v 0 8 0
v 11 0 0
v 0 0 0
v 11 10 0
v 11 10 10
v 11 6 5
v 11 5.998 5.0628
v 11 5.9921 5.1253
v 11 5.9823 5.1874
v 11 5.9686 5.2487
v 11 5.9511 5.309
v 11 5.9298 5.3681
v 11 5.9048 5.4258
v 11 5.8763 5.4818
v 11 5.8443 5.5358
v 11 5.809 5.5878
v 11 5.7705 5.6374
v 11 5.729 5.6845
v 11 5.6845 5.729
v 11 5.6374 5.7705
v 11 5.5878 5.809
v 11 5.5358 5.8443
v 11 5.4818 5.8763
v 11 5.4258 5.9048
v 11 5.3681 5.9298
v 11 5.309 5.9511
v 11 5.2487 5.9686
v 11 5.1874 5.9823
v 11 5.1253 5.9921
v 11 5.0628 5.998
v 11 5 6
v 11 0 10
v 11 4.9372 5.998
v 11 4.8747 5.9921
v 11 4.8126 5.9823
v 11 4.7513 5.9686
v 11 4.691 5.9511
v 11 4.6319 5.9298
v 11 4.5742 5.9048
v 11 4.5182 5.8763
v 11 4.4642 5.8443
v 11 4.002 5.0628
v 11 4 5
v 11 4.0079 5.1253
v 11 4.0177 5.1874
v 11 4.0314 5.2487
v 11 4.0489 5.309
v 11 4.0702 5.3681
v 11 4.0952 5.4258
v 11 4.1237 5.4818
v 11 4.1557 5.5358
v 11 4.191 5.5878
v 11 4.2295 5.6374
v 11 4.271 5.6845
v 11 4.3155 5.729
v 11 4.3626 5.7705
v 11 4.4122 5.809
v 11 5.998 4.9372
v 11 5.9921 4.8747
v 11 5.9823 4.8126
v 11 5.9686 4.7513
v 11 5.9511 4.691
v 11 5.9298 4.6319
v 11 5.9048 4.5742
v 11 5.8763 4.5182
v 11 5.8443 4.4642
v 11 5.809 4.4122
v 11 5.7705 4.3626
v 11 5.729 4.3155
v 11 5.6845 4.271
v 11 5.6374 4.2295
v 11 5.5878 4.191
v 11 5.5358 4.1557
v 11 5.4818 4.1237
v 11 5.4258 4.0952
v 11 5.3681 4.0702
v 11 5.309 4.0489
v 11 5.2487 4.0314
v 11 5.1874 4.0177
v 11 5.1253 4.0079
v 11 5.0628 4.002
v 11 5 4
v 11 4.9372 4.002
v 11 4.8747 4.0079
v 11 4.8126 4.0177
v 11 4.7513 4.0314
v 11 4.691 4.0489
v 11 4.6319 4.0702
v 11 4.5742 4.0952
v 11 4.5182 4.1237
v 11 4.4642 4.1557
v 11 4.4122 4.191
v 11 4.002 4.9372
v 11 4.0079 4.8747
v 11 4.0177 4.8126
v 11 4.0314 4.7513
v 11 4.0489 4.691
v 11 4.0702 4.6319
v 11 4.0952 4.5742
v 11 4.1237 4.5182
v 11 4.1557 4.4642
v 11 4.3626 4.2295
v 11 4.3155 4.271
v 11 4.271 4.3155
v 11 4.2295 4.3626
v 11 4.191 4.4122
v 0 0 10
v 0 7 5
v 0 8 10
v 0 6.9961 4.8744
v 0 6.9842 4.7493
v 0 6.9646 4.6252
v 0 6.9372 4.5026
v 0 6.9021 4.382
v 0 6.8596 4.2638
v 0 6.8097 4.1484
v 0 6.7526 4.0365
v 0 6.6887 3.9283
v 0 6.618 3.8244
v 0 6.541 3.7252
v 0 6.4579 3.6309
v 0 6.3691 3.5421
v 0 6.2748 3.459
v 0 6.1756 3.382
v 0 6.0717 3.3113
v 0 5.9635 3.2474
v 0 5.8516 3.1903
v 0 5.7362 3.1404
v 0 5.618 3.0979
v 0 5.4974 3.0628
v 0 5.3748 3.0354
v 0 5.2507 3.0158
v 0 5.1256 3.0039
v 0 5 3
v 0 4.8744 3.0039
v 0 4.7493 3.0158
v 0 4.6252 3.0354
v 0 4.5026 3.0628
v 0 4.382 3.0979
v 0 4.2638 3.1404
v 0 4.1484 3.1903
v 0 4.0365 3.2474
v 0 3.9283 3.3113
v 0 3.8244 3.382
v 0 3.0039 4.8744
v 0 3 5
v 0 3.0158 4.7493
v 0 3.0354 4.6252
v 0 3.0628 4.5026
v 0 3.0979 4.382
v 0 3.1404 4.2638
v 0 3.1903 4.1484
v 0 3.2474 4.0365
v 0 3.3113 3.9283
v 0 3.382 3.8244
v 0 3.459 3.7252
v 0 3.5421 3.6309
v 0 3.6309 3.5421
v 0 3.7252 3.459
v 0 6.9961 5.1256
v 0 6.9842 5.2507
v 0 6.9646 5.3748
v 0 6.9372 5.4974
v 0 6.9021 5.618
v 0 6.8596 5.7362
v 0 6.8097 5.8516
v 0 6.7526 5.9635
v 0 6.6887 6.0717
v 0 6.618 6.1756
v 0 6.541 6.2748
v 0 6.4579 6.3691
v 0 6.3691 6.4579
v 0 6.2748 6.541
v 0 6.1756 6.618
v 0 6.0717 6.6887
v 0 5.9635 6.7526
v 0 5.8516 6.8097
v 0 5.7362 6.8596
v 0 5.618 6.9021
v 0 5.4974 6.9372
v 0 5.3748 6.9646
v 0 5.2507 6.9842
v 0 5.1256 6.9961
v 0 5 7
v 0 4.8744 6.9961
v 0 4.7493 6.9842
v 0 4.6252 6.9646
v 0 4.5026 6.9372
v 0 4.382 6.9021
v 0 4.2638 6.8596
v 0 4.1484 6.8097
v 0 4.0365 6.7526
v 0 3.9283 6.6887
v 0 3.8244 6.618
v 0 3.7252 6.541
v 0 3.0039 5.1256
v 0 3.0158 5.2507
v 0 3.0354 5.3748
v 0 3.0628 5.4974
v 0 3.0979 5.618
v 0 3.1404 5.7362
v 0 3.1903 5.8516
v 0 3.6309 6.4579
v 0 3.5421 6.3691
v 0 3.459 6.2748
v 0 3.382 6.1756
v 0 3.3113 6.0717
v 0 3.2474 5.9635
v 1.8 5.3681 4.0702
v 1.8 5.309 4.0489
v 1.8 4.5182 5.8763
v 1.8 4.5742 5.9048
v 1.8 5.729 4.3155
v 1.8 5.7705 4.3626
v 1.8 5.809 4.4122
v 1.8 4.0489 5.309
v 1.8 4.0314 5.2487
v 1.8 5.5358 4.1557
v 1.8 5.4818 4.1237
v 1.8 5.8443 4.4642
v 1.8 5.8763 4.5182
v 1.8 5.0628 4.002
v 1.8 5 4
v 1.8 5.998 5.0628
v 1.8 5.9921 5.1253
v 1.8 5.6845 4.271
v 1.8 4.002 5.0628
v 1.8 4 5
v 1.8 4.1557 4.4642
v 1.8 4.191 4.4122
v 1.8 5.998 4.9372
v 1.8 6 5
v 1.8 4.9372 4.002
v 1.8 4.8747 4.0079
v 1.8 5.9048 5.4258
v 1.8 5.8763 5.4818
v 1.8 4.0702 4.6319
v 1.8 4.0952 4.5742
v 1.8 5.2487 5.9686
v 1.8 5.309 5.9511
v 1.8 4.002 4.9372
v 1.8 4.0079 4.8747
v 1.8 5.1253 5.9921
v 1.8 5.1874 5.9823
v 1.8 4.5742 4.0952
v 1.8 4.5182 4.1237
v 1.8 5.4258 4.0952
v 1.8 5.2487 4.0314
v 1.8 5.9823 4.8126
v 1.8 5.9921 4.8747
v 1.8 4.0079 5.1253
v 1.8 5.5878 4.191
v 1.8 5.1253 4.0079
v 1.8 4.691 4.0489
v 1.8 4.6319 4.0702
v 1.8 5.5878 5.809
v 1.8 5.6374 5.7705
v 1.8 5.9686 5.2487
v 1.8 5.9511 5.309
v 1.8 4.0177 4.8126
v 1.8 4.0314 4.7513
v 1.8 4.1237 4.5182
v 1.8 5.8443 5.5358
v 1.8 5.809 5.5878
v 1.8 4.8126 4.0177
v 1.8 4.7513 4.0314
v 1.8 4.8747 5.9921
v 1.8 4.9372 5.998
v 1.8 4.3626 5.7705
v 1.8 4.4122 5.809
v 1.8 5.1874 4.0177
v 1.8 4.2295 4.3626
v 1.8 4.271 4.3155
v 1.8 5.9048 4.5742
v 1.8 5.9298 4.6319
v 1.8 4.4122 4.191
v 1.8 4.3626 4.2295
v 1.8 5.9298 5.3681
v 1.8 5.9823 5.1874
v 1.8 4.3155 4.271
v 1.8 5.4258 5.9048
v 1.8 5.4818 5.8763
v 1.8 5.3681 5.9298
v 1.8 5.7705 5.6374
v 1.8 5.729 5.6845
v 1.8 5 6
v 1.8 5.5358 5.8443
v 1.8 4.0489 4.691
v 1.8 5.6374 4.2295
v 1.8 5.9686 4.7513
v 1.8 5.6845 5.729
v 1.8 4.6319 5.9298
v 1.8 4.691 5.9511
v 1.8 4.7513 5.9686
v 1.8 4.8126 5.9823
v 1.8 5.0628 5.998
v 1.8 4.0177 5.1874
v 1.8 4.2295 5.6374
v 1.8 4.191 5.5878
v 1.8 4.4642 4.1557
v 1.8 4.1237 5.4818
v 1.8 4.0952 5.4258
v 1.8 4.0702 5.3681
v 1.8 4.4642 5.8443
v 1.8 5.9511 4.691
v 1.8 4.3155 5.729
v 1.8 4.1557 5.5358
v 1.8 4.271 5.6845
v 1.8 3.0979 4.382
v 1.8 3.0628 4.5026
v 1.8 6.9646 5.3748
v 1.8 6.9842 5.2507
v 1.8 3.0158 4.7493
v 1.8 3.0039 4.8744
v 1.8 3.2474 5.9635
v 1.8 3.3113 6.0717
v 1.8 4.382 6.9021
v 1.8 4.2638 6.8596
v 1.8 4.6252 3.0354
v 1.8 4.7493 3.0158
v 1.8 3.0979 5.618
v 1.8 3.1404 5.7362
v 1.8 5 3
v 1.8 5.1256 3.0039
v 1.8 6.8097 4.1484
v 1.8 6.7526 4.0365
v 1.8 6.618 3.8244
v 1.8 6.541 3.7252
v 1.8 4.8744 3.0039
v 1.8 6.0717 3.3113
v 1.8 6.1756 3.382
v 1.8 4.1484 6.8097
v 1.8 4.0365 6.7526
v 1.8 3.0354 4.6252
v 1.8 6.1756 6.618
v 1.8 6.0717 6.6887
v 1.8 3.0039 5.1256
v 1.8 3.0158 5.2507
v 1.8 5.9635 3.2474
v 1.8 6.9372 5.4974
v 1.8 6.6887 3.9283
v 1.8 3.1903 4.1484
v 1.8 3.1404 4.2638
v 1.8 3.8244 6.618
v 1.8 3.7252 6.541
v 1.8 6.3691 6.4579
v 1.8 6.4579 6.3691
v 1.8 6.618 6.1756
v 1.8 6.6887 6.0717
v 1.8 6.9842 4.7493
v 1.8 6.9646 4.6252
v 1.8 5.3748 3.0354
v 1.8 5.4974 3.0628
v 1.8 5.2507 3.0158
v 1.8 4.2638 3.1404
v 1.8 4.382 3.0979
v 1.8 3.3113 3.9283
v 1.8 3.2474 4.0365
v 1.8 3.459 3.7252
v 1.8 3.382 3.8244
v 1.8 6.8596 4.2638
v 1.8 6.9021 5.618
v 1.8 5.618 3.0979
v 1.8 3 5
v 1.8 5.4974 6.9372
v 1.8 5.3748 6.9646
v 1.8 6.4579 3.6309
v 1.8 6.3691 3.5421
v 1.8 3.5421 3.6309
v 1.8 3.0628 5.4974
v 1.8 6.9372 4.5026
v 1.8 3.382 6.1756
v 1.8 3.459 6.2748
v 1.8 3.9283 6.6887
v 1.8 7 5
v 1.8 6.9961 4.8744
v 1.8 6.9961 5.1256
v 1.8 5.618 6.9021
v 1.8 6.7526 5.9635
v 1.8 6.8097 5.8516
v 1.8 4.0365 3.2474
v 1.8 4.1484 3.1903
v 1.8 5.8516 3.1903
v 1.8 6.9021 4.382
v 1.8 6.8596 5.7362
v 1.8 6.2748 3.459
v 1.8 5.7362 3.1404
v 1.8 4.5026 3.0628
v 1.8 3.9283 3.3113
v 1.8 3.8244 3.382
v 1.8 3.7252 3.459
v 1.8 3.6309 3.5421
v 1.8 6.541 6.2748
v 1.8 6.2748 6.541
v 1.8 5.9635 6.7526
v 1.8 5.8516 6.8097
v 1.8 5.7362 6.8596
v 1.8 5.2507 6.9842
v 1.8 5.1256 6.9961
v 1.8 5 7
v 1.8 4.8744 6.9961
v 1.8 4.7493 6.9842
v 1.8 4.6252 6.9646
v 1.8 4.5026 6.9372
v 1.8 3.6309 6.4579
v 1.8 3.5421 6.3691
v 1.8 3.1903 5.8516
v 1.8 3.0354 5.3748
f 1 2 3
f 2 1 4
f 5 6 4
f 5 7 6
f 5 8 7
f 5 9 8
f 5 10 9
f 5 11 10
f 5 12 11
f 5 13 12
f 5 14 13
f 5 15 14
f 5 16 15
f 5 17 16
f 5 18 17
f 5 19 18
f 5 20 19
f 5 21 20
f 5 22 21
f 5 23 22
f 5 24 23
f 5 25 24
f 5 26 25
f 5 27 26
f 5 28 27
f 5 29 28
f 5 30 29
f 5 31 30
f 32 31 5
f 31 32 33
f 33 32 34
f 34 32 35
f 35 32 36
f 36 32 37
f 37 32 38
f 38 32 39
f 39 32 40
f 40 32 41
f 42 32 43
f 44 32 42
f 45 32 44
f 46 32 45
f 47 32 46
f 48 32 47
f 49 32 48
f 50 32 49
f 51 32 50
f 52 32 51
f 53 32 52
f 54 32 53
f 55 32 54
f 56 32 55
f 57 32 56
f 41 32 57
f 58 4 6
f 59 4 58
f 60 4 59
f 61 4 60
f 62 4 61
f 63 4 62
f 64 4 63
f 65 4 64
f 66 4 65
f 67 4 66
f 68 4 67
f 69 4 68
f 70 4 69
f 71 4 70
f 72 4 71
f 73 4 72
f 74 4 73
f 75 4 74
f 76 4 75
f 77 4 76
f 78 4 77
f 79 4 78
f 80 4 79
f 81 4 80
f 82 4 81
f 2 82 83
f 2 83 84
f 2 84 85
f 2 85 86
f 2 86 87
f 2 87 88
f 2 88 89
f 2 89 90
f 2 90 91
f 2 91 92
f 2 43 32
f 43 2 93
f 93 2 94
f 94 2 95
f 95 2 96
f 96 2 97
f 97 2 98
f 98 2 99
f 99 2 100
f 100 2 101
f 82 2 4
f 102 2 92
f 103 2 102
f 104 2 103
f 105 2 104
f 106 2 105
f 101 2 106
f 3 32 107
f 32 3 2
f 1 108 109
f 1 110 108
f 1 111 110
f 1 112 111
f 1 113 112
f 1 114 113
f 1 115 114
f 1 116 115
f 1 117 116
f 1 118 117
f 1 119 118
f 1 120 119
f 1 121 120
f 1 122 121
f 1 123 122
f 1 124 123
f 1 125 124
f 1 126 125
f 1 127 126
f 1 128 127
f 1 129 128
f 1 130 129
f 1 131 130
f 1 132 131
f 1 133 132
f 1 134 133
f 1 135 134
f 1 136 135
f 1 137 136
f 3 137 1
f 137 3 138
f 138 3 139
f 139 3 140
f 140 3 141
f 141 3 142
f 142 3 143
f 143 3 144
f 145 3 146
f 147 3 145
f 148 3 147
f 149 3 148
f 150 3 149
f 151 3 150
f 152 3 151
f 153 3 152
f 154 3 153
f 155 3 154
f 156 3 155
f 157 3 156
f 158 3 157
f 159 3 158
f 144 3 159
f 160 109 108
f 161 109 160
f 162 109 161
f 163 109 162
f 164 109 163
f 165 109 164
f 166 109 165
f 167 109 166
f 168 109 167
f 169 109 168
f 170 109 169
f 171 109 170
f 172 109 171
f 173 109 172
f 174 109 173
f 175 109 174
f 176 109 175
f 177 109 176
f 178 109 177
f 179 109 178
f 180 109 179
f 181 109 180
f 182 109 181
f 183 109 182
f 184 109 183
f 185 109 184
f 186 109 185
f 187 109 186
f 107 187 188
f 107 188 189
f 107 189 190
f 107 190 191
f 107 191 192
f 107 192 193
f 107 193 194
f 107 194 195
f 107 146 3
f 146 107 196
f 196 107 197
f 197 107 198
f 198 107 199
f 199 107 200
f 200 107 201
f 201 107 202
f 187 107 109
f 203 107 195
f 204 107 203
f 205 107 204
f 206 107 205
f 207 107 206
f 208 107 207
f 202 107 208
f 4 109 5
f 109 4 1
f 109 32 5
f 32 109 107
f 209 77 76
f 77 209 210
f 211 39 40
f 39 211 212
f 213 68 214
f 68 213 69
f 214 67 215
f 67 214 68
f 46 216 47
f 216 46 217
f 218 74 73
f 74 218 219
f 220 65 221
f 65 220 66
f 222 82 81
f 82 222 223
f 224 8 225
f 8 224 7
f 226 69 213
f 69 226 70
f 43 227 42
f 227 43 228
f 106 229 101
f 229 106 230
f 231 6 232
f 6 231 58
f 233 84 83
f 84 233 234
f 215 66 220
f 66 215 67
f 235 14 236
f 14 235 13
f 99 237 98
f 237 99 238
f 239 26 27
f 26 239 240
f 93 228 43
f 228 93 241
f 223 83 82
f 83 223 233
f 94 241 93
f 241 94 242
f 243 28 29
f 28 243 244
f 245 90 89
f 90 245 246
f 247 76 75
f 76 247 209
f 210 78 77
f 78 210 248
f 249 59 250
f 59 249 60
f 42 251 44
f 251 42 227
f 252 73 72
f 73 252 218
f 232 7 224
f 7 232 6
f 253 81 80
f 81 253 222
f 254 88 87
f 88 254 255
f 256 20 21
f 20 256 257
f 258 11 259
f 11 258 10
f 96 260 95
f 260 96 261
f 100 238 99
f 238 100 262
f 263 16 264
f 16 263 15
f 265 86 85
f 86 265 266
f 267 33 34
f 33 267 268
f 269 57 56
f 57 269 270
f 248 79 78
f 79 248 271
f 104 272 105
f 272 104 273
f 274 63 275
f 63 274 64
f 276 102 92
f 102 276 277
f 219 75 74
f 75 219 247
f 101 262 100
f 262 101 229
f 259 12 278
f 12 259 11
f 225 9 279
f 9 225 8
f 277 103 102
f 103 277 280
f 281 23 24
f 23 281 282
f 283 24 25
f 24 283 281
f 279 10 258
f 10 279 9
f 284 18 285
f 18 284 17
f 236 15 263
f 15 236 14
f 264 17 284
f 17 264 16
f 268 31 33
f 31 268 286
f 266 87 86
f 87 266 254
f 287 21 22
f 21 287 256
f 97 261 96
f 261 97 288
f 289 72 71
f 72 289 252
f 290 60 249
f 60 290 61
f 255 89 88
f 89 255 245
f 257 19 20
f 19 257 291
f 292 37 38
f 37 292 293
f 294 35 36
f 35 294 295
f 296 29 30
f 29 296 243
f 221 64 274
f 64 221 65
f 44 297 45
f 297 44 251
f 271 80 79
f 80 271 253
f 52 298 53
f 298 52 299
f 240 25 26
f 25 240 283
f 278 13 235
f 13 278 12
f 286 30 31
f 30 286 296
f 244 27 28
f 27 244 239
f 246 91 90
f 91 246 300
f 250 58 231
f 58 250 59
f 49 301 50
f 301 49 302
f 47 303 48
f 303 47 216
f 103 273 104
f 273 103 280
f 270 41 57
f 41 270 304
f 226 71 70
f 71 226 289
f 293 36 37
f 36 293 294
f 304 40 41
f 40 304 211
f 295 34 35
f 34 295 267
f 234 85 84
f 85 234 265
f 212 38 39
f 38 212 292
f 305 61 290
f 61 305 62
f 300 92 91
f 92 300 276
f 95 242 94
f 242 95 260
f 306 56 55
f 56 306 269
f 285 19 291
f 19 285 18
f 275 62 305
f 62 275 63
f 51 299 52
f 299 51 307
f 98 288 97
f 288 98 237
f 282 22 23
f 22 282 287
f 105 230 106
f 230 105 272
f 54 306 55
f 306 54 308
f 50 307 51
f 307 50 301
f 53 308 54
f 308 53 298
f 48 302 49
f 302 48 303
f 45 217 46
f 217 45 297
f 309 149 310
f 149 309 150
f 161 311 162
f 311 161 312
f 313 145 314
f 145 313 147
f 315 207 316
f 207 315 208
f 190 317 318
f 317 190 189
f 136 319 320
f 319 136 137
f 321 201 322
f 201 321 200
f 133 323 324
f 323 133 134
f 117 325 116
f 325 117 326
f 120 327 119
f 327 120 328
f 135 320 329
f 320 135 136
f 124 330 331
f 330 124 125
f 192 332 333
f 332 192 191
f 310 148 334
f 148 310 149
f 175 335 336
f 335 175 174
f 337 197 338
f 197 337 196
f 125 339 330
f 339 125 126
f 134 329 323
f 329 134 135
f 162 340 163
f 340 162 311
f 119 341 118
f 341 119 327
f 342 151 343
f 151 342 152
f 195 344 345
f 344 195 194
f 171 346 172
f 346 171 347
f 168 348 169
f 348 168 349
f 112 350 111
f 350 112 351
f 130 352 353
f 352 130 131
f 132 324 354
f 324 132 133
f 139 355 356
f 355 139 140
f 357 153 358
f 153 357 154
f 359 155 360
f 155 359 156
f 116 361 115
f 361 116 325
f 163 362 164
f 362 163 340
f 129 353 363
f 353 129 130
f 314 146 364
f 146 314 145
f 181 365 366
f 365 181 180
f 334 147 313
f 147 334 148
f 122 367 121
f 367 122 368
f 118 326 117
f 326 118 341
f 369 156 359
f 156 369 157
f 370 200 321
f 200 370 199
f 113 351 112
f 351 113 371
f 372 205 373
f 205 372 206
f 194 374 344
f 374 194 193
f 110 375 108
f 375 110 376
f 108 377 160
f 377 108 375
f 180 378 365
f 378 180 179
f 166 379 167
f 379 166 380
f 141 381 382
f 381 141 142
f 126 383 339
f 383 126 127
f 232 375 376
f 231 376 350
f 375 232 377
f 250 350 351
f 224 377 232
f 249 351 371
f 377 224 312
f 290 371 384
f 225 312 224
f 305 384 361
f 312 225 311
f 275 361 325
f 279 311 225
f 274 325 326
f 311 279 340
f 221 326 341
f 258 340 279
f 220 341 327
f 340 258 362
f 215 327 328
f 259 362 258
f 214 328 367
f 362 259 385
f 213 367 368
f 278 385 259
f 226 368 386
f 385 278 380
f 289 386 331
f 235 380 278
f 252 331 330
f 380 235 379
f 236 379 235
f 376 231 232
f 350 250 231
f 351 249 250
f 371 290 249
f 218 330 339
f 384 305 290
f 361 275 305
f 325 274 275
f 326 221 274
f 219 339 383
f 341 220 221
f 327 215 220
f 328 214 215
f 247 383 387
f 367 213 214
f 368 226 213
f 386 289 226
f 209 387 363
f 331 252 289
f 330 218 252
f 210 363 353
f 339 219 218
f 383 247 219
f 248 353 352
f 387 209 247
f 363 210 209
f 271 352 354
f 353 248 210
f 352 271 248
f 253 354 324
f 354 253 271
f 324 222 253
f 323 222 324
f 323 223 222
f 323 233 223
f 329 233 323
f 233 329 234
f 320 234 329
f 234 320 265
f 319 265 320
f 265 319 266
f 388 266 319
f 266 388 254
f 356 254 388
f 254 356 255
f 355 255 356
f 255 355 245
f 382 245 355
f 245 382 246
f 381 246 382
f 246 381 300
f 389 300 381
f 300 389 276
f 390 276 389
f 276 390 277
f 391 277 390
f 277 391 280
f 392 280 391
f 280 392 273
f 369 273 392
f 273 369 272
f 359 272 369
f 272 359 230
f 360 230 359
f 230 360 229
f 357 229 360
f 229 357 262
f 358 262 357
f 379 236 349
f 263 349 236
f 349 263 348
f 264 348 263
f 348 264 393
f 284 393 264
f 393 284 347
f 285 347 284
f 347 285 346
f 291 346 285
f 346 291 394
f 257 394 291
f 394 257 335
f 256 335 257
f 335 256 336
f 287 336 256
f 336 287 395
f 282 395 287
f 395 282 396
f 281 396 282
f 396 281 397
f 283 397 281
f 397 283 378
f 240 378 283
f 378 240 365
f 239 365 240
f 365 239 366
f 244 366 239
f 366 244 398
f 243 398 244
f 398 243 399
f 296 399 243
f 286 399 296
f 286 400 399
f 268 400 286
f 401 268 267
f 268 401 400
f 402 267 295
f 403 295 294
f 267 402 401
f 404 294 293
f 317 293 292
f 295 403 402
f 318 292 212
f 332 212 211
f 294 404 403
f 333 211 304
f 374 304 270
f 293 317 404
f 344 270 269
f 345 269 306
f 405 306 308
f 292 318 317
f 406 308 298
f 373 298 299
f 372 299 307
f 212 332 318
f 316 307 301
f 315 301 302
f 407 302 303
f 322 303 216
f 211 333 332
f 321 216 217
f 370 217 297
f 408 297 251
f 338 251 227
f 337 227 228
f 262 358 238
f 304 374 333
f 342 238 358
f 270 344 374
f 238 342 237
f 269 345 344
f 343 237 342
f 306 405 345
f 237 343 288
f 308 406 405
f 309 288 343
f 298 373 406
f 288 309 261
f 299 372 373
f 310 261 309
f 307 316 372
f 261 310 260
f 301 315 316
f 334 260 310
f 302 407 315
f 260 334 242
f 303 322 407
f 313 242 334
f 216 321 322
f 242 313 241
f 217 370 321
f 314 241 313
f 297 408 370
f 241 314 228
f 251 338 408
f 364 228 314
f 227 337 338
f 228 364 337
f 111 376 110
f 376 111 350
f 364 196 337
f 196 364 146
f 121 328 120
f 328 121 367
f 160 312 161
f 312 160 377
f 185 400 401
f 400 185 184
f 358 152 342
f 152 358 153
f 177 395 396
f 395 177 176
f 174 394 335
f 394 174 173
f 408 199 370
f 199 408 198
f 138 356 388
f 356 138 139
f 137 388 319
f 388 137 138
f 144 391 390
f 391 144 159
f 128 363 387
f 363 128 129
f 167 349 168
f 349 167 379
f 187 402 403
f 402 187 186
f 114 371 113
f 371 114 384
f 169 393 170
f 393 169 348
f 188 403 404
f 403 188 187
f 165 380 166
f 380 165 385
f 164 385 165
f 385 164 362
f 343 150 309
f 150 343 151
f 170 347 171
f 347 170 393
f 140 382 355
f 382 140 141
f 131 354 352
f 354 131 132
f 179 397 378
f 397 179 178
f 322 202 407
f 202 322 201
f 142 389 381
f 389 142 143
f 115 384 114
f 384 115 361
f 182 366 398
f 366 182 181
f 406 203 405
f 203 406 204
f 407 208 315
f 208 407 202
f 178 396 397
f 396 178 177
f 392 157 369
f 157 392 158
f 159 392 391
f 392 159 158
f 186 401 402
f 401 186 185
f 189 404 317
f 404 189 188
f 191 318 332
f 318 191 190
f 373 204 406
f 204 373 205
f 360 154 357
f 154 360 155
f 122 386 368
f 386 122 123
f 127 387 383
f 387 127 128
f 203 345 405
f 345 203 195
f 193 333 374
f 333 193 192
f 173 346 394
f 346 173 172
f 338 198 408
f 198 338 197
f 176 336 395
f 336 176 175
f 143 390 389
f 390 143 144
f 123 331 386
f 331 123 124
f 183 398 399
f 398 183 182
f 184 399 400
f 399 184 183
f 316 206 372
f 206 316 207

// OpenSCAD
//cylinder(15,15,10,$fn=4);
//cube ([10,8,8]);
//cube(30);
//cube (size=10, center=true);
//cube ([5,10,15]);
difference(){
difference(){
linear_extrude(height = 10, convexity = 10, twist = 0)
  polygon ([[0,0],[0,8],[11,10],[11,0]]);
 $fn = 100; 
translate([-2,5,5]) rotate ([0,90,0]) cylinder(r=1, h=14); }
$fn = 100; 
translate([-0.2,5,5]) rotate ([0,90,0]) cylinder(r=2, h=2); }

  
